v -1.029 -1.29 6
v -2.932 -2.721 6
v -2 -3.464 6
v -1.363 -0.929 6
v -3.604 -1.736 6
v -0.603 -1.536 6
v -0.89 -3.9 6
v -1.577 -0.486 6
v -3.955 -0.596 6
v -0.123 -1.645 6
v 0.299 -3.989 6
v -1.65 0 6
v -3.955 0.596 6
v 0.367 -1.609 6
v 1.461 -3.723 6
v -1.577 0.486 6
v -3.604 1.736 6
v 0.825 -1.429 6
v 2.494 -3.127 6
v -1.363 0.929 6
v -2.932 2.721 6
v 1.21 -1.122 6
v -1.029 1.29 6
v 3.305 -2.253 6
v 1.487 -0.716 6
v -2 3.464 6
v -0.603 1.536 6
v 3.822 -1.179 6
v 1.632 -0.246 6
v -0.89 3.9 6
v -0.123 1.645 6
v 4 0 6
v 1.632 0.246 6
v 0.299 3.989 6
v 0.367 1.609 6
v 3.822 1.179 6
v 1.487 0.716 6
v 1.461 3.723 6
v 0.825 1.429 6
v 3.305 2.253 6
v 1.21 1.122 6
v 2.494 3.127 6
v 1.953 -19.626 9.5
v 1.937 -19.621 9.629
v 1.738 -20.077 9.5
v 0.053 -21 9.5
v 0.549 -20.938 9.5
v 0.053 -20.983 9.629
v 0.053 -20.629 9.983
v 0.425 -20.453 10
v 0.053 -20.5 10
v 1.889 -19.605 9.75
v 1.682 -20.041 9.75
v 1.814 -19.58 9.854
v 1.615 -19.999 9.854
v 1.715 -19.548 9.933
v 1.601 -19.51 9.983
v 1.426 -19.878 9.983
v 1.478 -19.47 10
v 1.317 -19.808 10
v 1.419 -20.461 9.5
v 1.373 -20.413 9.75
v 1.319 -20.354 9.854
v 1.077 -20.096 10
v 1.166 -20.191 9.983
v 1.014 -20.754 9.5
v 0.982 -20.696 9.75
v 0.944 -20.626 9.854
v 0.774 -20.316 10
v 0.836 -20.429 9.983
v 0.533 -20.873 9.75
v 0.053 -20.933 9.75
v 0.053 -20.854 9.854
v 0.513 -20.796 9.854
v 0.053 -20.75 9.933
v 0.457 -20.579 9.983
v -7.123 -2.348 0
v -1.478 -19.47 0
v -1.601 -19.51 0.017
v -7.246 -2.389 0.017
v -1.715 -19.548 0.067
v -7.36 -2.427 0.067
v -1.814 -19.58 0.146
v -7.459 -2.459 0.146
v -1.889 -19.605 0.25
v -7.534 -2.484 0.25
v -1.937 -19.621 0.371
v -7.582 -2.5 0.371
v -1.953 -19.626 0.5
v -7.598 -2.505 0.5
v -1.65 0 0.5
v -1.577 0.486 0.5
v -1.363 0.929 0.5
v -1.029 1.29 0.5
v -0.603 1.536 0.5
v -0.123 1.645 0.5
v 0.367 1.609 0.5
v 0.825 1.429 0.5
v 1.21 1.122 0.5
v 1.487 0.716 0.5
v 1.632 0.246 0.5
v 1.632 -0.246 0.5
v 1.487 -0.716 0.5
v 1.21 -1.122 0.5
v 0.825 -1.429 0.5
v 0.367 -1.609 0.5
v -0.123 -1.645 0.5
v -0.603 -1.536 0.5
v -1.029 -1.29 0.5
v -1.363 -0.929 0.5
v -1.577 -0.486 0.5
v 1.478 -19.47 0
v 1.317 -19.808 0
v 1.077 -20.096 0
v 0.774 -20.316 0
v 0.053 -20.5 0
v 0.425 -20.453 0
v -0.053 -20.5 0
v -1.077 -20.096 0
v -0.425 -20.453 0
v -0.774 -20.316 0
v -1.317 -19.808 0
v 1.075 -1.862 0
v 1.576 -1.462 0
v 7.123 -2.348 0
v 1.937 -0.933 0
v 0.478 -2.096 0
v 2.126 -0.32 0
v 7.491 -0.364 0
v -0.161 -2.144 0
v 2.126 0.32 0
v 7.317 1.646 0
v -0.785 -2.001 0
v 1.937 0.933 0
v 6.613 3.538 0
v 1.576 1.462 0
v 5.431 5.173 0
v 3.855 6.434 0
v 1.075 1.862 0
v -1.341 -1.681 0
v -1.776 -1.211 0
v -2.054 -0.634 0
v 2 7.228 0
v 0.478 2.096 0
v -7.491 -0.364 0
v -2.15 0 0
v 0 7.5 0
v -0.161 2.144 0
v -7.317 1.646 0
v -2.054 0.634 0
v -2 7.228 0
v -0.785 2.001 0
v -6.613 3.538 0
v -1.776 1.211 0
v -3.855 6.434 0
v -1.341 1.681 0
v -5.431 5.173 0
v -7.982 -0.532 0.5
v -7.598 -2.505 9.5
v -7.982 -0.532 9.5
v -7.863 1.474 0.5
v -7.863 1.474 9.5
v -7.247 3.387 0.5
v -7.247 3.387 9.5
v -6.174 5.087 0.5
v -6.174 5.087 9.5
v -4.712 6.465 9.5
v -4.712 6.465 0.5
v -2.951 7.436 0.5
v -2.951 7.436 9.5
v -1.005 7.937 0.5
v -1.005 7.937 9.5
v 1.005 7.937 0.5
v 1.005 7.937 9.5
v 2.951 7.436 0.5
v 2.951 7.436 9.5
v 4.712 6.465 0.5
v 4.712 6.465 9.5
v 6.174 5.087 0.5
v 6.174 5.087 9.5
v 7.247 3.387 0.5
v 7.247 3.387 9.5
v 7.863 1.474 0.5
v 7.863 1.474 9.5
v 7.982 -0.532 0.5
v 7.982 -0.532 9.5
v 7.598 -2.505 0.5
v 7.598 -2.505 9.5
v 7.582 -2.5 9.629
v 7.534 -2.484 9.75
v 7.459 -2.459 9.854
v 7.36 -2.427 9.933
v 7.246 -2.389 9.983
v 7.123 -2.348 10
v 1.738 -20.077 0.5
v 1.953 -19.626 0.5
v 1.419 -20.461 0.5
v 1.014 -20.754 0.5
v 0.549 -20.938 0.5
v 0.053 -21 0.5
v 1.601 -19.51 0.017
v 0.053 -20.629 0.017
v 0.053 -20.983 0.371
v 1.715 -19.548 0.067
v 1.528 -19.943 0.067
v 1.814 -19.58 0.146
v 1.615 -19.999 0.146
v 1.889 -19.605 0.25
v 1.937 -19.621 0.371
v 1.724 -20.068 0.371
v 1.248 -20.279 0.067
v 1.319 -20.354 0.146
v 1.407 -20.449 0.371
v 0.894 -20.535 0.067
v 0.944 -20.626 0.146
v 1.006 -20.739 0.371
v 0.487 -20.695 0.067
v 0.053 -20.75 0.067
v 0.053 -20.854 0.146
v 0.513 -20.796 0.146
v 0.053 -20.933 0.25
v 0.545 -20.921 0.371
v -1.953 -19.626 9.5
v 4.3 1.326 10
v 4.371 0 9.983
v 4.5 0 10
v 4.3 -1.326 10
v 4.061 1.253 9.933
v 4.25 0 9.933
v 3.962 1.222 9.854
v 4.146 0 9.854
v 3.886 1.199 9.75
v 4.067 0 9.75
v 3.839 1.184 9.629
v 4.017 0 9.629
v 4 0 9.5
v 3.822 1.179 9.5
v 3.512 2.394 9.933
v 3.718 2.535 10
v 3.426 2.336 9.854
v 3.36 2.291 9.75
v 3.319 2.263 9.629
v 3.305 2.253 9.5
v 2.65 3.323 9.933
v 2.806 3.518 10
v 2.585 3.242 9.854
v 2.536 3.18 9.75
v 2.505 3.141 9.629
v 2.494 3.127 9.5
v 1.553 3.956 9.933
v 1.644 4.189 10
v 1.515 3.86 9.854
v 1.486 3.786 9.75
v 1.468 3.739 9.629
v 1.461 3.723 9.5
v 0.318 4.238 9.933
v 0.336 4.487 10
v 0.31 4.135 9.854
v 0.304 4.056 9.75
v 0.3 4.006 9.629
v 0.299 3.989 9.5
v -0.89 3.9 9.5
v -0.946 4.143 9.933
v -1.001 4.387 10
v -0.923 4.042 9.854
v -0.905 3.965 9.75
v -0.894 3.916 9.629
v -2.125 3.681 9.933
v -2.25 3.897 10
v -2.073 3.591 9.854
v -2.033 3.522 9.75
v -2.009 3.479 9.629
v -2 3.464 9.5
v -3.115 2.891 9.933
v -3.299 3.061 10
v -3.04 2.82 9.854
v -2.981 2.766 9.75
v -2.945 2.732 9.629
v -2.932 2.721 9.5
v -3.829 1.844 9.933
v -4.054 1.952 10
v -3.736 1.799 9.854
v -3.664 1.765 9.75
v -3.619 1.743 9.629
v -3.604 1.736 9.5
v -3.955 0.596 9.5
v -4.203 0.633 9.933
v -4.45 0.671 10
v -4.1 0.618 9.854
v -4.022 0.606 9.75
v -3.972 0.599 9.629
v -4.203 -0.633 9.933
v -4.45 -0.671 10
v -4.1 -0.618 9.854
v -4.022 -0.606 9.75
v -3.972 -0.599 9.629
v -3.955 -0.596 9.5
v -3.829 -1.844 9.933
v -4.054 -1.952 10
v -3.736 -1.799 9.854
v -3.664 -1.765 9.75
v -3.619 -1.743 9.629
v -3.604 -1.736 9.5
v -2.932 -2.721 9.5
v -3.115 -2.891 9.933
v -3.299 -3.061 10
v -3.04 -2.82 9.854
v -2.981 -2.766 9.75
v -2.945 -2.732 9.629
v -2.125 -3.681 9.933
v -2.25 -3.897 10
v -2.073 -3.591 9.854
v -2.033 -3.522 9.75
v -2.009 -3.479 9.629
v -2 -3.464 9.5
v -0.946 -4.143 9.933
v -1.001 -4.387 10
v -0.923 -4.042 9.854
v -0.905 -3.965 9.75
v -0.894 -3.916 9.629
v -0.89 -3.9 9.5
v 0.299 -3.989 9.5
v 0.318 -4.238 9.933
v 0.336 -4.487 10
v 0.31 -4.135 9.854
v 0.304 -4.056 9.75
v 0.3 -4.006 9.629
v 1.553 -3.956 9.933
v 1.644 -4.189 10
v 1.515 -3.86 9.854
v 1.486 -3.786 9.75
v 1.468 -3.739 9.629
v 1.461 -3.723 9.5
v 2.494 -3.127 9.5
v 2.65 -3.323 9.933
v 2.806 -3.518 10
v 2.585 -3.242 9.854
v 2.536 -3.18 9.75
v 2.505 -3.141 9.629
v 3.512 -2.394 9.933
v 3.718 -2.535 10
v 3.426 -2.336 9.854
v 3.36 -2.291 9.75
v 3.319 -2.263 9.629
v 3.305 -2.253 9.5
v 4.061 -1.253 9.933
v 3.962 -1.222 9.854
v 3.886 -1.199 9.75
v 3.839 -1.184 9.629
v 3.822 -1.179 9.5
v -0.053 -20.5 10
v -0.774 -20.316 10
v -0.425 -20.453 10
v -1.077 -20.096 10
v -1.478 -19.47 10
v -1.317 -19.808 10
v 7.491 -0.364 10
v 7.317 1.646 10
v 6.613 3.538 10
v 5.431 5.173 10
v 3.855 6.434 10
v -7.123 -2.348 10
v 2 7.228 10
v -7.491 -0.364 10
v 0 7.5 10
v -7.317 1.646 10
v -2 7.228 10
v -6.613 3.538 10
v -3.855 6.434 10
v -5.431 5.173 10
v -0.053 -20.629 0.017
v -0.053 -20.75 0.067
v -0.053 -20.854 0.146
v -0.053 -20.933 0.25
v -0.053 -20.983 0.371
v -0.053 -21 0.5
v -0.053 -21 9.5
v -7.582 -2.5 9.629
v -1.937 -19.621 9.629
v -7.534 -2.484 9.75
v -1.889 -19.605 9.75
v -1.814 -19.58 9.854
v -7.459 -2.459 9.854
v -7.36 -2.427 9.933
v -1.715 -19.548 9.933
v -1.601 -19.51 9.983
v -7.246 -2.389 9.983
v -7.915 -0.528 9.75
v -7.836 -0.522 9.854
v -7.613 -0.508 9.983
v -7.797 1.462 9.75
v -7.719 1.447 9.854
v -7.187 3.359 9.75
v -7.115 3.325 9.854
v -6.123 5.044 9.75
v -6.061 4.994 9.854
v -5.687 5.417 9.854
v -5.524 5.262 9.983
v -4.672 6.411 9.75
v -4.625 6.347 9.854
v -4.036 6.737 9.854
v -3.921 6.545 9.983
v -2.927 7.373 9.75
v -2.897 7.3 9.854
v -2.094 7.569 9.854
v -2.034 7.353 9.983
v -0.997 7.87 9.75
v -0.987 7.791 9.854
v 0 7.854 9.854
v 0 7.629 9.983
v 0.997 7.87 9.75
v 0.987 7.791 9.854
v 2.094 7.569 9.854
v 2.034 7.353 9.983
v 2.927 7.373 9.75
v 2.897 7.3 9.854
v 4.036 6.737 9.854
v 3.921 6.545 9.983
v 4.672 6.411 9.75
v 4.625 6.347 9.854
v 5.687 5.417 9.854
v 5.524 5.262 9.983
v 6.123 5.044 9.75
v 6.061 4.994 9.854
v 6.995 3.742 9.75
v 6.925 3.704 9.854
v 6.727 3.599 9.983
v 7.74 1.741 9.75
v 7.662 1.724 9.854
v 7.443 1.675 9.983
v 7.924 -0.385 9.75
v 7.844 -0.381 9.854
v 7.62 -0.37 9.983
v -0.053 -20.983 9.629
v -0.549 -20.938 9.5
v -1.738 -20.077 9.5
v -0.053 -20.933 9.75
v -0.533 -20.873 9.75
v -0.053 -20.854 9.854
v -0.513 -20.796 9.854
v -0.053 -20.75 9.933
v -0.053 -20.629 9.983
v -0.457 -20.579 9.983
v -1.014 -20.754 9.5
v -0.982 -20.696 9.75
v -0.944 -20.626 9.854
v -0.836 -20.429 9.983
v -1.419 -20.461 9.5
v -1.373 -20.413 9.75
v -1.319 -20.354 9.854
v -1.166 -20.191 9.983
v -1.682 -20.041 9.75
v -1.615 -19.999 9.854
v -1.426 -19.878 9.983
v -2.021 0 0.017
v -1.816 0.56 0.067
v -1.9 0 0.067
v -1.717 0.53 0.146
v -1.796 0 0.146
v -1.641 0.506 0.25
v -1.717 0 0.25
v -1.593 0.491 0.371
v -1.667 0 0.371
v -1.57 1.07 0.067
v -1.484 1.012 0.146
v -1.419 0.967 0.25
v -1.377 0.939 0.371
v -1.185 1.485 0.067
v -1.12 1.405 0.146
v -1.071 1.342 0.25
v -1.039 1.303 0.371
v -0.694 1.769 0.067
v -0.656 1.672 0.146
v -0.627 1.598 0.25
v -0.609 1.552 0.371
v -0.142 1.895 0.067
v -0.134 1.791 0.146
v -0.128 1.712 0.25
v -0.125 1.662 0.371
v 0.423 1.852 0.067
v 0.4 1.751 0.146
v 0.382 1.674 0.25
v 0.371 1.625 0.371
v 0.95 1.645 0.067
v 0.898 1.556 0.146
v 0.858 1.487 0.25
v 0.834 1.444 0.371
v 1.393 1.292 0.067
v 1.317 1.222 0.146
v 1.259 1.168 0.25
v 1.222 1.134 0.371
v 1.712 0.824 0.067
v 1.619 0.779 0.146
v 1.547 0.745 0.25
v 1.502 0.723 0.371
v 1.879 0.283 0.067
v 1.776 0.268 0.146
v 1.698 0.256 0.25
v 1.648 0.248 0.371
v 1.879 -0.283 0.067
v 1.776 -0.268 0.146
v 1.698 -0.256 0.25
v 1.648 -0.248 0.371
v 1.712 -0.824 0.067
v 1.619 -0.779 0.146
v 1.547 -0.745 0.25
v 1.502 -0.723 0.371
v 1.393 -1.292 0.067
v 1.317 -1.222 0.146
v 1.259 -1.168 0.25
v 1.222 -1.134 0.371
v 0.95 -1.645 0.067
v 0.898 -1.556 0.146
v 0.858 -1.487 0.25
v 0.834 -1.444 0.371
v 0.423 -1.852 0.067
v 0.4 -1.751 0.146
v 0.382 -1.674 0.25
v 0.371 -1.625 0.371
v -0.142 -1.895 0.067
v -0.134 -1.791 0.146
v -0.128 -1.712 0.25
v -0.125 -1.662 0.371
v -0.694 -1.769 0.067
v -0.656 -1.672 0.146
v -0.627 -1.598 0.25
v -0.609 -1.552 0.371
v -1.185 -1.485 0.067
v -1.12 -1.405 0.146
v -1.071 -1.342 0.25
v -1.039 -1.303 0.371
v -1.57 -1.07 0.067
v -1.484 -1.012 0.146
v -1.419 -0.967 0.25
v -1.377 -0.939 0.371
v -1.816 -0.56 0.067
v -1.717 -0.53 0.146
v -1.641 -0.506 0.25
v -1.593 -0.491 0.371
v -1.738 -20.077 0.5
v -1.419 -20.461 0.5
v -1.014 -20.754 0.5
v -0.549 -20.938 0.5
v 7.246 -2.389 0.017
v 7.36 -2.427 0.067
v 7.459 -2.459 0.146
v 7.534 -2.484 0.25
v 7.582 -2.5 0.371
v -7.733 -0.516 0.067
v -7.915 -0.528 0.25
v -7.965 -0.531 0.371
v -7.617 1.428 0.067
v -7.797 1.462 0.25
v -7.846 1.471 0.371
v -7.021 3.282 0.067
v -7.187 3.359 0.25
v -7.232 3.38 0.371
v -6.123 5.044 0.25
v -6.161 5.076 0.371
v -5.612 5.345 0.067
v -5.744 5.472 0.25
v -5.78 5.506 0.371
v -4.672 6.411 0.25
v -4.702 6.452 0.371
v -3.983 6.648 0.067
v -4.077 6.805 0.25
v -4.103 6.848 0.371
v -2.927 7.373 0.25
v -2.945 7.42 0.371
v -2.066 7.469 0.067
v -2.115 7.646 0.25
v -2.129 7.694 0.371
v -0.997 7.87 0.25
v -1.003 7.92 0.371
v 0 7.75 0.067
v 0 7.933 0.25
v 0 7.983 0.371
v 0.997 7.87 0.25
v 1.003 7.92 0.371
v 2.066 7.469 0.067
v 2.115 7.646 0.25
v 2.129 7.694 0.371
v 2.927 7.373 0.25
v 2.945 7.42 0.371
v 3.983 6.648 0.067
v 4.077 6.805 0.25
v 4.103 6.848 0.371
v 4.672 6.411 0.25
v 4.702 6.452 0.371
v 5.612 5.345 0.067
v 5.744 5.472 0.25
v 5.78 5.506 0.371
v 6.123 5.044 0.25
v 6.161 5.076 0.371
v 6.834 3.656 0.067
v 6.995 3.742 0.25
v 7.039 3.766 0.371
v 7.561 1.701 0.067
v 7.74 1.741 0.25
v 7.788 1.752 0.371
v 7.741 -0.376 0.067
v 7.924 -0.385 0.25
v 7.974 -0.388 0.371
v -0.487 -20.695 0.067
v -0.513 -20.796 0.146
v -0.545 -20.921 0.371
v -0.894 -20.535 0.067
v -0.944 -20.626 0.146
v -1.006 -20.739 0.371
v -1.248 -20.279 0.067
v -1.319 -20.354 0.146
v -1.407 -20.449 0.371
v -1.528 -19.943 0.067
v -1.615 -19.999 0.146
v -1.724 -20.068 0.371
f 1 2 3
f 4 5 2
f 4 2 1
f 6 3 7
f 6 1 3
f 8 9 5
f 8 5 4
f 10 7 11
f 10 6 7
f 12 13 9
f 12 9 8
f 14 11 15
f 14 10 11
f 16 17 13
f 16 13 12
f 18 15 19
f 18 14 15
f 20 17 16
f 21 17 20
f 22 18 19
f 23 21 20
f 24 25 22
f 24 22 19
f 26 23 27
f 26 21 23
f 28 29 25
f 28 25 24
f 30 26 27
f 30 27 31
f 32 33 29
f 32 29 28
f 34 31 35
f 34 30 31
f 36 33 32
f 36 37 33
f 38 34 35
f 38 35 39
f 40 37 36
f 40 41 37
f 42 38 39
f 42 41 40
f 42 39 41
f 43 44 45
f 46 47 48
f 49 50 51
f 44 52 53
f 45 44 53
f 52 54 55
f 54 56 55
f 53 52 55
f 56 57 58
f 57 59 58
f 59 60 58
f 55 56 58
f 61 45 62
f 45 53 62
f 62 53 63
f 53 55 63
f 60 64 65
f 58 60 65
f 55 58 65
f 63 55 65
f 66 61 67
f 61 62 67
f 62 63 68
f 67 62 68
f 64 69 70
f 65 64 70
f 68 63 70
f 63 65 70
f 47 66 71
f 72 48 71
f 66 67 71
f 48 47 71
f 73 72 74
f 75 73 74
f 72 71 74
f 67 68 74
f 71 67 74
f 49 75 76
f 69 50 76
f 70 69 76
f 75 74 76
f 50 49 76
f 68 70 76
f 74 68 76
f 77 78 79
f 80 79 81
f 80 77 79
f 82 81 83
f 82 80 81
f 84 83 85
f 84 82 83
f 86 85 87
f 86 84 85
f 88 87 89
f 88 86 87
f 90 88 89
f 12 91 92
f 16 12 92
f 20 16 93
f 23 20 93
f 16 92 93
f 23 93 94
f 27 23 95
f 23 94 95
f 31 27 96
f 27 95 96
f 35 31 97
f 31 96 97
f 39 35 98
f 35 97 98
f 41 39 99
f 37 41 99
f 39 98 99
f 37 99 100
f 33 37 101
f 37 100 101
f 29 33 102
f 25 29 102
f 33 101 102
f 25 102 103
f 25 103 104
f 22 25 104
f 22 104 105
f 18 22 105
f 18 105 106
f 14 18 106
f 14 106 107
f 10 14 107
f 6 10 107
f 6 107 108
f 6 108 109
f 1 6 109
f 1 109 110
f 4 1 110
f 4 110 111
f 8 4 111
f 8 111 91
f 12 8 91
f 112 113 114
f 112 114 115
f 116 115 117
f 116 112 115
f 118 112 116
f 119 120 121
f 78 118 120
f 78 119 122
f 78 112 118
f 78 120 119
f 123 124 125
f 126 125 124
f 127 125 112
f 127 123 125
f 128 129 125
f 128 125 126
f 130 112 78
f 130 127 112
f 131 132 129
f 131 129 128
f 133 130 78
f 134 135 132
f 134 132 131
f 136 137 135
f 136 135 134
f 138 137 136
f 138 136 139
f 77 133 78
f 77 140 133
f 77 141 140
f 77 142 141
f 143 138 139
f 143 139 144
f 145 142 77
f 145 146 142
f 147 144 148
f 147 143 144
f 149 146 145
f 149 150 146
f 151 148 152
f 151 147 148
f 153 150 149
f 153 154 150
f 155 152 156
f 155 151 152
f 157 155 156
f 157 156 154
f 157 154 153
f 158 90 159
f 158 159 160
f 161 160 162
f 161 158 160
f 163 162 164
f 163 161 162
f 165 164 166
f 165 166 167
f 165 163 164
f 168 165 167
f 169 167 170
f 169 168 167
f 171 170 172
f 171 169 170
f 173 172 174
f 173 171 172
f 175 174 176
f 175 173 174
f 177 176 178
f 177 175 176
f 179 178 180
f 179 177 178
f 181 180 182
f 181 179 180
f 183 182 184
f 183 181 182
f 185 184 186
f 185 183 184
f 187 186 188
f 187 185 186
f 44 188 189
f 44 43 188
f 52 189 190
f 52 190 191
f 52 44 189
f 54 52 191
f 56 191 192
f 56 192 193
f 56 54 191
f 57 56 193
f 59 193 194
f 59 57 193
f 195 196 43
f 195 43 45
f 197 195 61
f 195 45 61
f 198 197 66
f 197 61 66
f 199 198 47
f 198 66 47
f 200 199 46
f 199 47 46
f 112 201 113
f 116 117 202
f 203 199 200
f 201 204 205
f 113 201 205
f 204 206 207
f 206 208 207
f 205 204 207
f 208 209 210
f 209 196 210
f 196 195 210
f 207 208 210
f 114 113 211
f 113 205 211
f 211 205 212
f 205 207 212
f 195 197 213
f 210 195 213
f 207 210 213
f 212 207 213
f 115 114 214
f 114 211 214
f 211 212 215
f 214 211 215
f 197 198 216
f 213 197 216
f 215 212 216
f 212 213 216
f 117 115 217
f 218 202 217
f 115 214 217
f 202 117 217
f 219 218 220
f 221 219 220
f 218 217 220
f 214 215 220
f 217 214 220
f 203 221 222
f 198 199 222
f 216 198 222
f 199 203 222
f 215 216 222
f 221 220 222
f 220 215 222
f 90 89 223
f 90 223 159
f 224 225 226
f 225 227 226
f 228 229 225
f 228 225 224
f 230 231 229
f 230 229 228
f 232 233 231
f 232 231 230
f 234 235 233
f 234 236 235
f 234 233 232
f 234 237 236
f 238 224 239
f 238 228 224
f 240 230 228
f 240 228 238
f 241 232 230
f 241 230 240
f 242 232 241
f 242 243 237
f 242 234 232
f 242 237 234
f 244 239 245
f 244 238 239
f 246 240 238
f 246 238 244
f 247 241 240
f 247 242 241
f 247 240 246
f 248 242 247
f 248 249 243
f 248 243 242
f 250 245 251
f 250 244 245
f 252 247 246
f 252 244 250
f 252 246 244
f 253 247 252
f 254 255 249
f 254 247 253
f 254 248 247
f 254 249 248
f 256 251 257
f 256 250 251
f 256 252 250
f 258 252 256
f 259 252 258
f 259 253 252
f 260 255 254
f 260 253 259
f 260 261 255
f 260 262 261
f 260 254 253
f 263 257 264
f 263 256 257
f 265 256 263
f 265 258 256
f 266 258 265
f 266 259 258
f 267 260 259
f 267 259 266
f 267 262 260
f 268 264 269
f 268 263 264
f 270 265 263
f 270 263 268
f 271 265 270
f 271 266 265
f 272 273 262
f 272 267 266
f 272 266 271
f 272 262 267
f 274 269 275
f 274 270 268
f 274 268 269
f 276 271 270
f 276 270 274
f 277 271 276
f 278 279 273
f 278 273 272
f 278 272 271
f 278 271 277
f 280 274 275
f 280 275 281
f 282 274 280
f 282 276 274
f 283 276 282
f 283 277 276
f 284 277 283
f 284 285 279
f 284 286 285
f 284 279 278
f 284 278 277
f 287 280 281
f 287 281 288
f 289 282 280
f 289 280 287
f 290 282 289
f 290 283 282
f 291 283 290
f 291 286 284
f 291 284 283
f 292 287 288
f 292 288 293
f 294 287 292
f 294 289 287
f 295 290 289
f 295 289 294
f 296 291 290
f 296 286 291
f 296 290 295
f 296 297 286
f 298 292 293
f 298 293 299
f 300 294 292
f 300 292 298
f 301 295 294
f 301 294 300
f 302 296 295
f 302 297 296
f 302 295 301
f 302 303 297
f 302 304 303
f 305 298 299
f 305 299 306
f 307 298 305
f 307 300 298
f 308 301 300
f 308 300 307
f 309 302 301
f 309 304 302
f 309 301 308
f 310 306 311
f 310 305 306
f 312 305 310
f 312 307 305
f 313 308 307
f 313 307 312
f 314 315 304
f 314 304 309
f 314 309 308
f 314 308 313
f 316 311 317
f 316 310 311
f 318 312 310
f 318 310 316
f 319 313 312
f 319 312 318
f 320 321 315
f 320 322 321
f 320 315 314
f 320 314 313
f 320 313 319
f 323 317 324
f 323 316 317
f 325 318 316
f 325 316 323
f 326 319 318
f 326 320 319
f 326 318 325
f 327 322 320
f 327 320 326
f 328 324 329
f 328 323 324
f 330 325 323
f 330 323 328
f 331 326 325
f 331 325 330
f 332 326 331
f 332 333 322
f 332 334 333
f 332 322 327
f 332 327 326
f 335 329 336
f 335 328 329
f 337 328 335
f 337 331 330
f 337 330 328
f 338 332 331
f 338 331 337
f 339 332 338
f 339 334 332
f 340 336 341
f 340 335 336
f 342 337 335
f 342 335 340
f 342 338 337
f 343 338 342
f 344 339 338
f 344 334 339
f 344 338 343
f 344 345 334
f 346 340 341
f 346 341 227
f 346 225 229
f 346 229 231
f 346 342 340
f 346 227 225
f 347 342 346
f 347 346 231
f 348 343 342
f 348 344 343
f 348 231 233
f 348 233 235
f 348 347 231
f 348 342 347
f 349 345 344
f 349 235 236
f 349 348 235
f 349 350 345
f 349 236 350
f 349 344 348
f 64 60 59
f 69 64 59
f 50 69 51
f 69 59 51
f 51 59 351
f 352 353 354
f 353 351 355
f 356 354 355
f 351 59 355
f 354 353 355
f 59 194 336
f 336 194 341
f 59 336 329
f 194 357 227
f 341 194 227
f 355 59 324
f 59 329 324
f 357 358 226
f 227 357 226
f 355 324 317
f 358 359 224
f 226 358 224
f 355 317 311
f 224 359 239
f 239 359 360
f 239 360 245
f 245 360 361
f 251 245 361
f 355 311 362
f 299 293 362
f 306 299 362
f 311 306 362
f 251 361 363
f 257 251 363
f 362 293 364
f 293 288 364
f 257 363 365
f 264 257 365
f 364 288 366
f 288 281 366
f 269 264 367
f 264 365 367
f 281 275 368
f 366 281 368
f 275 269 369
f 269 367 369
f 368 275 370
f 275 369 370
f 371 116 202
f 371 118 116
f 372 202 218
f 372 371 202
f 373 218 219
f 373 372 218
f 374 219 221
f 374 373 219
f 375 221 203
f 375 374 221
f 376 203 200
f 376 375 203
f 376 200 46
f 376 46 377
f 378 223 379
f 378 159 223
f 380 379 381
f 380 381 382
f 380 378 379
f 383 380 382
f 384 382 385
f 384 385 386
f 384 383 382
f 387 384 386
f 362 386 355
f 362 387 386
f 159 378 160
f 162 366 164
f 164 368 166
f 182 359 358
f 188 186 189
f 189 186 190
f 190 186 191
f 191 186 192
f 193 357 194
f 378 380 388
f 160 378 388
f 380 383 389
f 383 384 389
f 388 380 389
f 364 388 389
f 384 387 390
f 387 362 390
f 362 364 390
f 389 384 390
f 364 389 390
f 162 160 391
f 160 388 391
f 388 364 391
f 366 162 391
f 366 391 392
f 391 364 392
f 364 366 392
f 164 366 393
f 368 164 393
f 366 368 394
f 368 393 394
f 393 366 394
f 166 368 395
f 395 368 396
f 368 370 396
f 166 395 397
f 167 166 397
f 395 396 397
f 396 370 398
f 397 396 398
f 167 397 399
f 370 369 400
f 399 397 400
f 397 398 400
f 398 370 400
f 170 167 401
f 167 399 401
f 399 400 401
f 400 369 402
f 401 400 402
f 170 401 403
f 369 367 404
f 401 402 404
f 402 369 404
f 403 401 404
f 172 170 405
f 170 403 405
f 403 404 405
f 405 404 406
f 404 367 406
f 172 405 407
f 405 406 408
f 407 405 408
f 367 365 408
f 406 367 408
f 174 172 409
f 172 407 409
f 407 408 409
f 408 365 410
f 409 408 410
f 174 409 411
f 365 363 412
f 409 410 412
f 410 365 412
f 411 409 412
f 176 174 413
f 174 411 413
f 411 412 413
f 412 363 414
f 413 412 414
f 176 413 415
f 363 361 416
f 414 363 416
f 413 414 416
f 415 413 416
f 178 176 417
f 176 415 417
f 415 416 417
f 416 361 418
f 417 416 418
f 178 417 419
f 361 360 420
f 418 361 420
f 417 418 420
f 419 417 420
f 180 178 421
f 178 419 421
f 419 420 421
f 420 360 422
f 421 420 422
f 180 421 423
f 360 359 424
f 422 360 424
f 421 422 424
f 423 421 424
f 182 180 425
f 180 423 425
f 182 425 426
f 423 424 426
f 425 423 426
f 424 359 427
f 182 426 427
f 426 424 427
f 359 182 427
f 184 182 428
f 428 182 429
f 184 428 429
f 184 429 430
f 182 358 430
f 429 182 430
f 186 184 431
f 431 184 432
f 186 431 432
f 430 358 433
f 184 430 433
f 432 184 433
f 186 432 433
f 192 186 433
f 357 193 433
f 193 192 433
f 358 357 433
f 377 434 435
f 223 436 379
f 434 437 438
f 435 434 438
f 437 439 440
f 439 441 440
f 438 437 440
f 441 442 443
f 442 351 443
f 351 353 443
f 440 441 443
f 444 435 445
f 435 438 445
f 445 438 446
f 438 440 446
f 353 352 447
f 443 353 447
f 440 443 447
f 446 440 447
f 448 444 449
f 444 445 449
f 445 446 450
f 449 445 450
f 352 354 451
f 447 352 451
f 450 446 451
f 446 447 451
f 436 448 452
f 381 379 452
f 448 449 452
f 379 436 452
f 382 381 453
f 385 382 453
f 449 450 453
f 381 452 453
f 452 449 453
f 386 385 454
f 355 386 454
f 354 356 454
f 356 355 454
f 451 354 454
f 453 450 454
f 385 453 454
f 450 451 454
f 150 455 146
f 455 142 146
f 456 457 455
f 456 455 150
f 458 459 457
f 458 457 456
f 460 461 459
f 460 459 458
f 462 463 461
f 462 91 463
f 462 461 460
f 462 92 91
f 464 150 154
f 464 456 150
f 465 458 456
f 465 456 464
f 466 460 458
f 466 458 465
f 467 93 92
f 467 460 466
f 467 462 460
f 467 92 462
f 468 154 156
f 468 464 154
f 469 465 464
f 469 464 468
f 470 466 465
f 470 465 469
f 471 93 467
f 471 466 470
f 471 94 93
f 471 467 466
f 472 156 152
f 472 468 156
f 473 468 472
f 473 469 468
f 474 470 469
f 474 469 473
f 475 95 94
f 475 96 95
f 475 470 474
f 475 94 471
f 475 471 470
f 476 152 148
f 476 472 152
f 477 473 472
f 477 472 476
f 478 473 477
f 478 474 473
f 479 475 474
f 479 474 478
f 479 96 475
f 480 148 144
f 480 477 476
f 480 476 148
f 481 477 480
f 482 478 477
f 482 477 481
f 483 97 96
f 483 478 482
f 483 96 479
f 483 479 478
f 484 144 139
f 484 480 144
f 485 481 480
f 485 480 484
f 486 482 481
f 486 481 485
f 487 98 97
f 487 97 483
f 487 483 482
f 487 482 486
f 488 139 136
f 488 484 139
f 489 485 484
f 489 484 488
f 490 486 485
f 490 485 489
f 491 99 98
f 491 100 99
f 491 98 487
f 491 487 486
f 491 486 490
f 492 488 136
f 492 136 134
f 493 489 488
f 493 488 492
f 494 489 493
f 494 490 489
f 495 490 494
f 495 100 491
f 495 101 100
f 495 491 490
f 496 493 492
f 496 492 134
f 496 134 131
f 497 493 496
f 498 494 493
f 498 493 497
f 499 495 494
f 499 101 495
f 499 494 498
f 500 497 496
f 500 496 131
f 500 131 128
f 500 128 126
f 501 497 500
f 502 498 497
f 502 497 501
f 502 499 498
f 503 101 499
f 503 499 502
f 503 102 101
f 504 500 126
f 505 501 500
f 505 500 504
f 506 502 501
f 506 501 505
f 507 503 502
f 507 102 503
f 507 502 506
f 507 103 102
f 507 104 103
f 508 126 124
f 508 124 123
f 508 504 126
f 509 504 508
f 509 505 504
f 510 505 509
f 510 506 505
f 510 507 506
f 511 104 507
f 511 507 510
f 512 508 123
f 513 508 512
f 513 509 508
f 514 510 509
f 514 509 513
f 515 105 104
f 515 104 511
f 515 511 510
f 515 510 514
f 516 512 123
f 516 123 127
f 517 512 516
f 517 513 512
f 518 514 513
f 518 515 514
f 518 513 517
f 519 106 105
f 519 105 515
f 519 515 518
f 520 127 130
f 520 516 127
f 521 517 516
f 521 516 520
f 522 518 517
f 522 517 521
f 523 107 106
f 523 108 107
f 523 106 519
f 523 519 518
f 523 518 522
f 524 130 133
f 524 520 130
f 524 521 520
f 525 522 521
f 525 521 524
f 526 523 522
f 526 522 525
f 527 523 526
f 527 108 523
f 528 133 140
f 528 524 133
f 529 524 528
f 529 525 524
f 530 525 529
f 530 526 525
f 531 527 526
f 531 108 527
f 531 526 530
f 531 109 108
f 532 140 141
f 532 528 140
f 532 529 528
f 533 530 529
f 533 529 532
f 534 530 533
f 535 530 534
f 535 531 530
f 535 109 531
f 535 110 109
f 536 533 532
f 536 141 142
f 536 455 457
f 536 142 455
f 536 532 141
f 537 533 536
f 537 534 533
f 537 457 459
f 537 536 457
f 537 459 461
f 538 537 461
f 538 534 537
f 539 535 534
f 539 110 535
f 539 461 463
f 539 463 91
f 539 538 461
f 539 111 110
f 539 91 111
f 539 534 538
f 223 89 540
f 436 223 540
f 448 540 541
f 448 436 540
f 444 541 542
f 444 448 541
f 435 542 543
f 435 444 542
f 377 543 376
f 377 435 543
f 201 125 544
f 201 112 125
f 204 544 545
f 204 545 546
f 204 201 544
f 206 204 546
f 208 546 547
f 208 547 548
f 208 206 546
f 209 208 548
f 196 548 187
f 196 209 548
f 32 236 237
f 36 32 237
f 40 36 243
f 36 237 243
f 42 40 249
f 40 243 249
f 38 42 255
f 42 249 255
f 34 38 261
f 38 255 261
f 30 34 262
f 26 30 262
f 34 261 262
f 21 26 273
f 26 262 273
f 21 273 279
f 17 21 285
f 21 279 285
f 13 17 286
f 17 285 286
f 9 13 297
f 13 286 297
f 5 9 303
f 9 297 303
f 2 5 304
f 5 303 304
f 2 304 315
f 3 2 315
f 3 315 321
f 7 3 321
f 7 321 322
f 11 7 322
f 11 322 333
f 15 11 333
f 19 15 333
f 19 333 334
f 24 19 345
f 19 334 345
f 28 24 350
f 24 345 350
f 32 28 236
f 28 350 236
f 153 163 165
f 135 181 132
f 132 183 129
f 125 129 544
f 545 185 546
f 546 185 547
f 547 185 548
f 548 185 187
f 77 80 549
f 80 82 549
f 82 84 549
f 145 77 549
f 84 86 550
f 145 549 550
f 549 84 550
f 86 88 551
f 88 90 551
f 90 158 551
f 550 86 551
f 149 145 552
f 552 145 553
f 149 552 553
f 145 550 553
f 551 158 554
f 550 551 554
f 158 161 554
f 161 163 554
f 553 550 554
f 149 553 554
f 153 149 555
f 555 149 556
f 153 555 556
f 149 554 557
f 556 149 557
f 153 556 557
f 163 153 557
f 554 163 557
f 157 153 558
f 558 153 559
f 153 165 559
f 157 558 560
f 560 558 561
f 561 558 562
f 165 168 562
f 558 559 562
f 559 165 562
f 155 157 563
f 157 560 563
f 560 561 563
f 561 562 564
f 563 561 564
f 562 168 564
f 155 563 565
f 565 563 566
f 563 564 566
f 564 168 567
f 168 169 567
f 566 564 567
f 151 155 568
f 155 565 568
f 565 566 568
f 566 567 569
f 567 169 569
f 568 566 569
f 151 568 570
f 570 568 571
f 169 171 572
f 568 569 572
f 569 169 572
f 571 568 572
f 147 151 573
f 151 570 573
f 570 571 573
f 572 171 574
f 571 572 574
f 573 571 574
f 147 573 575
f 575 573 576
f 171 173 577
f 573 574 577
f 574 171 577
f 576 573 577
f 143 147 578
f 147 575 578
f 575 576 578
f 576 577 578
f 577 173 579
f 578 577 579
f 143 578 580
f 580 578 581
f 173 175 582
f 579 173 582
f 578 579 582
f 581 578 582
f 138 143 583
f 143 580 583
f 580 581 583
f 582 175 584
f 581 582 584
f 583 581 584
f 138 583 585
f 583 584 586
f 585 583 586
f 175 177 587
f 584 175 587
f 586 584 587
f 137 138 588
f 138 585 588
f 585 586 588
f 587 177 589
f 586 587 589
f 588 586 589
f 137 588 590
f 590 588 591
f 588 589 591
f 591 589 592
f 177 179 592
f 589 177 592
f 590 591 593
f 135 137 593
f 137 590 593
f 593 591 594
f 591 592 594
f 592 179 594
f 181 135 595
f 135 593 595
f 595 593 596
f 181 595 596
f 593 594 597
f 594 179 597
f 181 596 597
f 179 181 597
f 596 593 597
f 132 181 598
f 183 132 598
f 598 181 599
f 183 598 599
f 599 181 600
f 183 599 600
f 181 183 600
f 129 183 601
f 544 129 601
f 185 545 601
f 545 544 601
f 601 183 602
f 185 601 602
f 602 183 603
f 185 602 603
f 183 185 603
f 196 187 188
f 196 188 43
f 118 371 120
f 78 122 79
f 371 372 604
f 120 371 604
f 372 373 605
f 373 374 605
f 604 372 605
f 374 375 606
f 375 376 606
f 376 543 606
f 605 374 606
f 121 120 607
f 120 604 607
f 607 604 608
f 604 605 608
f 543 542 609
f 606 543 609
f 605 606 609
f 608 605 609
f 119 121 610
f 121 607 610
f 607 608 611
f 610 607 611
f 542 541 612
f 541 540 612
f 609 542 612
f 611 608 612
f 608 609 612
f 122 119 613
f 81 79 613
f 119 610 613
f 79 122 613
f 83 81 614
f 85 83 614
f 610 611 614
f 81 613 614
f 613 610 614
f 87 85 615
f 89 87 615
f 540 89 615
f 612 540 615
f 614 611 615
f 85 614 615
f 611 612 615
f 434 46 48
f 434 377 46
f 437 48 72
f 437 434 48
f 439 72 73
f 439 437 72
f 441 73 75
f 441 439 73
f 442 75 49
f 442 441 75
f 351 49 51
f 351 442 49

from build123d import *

# Parameters (mm, degrees)
EXTRUDE_1_DEPTH     = 10
FILLET_1_R          = 2
SKETCH_4_R          = 4
CUT_EXTRUDE_1_DEPTH = 4
M4X0_71_D           = 3.3
FILLET_3_R          = 0.5


with BuildPart() as part:
    # Эскиз1 → Бобышка-Вытянуть1 (new body)
    with BuildSketch(Plane.XY):
        with BuildLine():
            Line((-1.5, -21), (-7.597720185, -2.504924749))
            ThreePointArc((-7.597720185, -2.504924749), (0, 8), (7.597720185, -2.504924749))
            Line((7.597720185, -2.504924749), (1.5, -21))
            Line((1.5, -21), (-1.5, -21))
        make_face()
    extrude(amount=EXTRUDE_1_DEPTH)

    # Скругление1
    fillet_1_edges = [part.edges().sort_by_distance(p)[0] for p in [
        (-1.5, -21, 5),
        (1.5, -21, 5),
    ]]
    fillet(fillet_1_edges, radius=FILLET_1_R)

    # Эскиз4 → Вырез-Вытянуть1 (cut)
    with BuildSketch(Plane.XY.offset(10)):
        Circle(SKETCH_4_R)
    extrude(amount=-CUT_EXTRUDE_1_DEPTH, mode=Mode.SUBTRACT)

    # Отверстие обработанное метчиком M4x0.71 (through all)
    with Locations(Plane.XY.offset(6)):
        with Locations((0, 0)):
            Hole(M4X0_71_D / 2)

    # Скругление3
    fillet_3_edges = [part.edges().sort_by_distance(p)[0] for p in [
        (0, 8, 10),
        (-4.77532194, -11.065577968, 10),
        (4.77532194, -11.065577968, 0),
        (4.77532194, -11.065577968, 10),
        (0, -21, 0),
        (-1.225572491, -20.620565083, 0),
        (1.225572491, -20.620565083, 0),
        (0, -21, 10),
        (-1.225572491, -20.620565083, 10),
        (1.225572491, -20.620565083, 10),
        (-4, 0, 10),
        (1.65, 0, 0),
        (-4.77532194, -11.065577968, 0),
        (0, 8, 0),
    ]]
    fillet(fillet_3_edges, radius=FILLET_3_R)


solid = part.part
